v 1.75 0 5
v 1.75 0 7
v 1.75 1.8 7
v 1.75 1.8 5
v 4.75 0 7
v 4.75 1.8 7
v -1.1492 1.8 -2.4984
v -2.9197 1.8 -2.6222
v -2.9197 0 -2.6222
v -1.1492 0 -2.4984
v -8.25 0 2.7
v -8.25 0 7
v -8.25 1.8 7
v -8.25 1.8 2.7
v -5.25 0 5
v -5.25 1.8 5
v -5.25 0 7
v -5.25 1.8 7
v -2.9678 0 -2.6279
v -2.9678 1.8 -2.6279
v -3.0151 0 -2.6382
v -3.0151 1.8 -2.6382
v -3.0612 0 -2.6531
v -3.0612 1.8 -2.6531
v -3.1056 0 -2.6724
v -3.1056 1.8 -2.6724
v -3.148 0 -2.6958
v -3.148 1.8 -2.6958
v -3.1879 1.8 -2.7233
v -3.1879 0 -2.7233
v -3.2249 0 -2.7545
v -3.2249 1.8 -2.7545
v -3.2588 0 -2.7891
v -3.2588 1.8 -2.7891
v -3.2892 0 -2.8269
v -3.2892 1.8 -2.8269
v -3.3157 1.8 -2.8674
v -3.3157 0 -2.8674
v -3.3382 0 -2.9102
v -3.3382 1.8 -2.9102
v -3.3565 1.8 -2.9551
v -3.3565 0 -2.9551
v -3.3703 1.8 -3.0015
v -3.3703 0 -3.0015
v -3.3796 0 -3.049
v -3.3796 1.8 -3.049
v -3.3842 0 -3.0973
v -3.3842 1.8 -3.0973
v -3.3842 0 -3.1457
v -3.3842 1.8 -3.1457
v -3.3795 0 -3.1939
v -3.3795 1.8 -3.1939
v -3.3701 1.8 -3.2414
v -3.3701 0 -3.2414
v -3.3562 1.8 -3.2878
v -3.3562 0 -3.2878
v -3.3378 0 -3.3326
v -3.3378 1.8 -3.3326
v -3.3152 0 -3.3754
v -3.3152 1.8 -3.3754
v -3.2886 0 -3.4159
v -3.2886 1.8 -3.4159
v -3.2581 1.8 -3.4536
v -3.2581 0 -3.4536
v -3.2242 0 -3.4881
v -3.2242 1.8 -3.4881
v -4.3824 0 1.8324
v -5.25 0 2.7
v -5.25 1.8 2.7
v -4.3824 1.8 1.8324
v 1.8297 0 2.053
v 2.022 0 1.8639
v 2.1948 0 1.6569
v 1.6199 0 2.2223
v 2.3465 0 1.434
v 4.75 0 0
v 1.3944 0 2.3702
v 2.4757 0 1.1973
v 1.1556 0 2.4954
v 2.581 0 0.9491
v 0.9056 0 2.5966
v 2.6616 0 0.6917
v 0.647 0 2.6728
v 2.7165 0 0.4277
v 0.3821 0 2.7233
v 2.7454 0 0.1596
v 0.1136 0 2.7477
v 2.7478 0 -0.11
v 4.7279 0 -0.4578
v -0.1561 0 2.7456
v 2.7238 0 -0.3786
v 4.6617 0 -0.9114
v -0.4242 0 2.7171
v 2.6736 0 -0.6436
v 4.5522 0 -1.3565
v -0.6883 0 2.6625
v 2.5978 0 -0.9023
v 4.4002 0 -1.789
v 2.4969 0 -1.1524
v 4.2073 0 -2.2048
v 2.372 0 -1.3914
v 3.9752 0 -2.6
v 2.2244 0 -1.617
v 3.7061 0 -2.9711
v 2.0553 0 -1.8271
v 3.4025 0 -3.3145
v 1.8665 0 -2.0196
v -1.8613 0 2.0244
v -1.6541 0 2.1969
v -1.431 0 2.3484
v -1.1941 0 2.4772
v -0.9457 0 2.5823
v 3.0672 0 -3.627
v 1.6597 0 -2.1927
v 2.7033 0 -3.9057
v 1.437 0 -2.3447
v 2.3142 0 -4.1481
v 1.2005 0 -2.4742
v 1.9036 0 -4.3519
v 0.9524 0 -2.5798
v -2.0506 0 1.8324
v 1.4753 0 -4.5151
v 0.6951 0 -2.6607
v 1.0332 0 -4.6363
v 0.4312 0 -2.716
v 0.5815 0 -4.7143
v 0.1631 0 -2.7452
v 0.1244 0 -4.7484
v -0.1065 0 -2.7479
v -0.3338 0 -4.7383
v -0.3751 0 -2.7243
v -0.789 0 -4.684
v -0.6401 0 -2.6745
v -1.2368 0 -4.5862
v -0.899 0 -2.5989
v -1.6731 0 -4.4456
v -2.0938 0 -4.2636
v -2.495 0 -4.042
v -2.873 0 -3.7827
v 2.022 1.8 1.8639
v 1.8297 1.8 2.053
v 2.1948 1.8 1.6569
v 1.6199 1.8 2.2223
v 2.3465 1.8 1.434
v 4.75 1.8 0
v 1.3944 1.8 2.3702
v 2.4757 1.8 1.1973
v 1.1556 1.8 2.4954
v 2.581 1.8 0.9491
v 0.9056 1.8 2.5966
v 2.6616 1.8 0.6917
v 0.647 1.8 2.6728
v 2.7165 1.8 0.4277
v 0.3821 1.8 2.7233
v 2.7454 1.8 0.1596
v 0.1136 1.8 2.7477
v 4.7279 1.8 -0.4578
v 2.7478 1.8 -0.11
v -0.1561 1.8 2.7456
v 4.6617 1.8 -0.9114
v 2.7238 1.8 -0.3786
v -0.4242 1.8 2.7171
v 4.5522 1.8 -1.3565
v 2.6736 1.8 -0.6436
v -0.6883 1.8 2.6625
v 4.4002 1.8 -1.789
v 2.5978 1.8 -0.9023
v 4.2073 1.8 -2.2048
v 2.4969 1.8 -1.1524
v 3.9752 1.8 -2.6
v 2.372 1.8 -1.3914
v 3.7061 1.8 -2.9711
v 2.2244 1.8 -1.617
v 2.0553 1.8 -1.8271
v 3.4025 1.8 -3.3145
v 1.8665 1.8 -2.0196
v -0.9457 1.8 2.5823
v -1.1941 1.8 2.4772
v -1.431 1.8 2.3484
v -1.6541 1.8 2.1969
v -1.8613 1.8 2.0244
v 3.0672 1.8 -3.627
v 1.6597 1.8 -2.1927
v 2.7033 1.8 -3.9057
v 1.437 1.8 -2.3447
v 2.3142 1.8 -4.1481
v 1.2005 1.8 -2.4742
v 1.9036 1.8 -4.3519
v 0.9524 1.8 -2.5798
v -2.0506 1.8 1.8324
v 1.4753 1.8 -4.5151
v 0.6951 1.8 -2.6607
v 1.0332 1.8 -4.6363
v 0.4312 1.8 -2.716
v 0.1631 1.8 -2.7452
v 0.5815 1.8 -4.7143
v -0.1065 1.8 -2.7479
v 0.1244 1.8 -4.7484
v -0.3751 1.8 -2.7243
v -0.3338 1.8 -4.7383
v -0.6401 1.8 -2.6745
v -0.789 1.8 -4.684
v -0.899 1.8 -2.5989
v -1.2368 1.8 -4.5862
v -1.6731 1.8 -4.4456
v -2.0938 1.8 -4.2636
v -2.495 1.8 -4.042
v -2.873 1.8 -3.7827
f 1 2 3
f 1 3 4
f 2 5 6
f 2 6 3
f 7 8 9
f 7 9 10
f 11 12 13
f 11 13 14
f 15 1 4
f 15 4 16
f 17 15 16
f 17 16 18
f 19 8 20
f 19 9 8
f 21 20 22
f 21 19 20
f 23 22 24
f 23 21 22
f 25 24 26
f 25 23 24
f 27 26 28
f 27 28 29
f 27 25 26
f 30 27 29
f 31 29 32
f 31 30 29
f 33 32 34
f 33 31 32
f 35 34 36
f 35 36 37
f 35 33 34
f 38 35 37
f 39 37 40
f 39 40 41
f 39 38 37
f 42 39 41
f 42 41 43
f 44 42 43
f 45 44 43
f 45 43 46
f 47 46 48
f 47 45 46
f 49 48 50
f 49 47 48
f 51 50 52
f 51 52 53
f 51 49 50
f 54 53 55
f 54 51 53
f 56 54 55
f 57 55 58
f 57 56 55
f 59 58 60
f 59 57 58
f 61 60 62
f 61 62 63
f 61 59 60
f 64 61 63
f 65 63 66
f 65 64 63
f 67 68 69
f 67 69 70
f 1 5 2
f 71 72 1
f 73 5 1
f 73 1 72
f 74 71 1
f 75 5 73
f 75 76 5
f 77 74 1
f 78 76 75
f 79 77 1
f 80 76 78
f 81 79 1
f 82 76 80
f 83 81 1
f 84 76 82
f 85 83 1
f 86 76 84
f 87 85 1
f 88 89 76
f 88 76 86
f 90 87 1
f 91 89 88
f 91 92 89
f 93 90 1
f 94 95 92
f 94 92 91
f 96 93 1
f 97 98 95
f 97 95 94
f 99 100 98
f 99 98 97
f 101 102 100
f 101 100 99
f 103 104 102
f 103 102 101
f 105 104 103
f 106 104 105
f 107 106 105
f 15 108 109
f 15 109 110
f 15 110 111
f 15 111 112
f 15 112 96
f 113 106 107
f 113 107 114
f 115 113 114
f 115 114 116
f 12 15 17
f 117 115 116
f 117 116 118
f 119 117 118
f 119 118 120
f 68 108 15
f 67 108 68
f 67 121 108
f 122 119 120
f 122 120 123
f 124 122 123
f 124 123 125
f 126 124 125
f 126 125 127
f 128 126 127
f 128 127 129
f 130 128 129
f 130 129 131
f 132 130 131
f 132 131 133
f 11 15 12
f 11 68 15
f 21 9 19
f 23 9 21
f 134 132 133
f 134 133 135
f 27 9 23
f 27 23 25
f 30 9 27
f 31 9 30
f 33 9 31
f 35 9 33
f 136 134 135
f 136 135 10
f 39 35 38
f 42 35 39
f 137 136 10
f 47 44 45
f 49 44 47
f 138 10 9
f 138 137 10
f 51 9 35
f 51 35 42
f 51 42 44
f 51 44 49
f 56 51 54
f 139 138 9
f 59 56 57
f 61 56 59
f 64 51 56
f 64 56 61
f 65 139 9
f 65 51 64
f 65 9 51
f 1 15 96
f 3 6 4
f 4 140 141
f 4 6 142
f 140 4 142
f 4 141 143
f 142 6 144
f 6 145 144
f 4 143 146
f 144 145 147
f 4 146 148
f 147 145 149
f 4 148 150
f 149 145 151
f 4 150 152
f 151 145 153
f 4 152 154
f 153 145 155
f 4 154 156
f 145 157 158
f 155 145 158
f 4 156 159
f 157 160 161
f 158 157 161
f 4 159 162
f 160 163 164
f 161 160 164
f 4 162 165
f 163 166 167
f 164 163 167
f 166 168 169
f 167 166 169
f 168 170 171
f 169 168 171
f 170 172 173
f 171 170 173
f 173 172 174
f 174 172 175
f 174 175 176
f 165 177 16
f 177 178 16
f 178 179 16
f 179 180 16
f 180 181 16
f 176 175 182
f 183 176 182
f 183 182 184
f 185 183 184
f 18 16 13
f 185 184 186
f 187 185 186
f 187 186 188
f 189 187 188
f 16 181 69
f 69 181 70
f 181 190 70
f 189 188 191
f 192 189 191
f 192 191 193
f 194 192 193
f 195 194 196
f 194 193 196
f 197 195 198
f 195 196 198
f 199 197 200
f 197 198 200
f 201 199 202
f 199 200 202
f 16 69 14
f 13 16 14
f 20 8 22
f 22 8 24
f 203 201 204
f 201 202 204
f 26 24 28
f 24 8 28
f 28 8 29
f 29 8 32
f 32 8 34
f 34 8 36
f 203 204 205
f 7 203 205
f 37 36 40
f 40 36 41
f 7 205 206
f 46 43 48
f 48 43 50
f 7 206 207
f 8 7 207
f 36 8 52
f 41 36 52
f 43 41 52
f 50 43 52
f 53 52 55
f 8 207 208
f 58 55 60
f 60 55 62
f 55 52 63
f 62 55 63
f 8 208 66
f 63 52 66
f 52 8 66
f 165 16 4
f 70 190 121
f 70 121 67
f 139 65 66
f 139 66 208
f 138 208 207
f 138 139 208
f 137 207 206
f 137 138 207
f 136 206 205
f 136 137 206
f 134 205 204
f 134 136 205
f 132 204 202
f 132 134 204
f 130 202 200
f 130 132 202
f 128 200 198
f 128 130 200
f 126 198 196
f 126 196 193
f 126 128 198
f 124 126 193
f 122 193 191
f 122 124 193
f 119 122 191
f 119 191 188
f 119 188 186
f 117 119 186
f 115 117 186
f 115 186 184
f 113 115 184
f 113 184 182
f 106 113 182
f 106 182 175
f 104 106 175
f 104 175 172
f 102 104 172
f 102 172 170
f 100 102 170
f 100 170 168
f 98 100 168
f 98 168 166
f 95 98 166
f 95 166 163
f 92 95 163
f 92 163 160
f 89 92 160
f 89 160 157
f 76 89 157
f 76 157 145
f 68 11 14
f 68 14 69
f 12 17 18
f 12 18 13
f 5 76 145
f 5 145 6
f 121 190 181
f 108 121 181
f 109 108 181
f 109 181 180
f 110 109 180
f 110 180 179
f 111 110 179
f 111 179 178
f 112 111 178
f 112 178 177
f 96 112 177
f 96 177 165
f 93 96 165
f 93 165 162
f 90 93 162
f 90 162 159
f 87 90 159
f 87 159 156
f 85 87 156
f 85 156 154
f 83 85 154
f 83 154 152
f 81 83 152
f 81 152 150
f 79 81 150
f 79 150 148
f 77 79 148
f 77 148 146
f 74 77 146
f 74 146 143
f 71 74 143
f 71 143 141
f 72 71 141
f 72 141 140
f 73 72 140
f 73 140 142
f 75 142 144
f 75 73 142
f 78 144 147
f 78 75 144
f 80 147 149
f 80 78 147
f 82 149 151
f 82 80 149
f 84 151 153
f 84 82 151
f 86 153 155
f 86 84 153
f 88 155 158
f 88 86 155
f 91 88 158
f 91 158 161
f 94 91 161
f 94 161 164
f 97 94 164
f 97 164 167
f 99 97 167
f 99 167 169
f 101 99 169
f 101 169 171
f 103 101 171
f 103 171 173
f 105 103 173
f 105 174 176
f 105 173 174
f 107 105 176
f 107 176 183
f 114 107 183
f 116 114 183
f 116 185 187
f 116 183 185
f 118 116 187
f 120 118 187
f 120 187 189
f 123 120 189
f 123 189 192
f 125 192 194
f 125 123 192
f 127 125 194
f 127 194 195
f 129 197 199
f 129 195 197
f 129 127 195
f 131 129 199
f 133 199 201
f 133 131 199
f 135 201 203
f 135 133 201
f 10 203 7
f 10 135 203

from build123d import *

# Parameters (mm, degrees)
SKETCH1_R           = 2.75
BOSS_EXTRUDE1_DEPTH = 1.8
CUT_EXTRUDE1_DEPTH  = 1.8
FILLET1_R           = 0.5


with BuildPart() as part:
    # Sketch1 → Boss-Extrude1 (new body)
    with BuildSketch(Plane(origin=(0, 0, 0), x_dir=(1, 0, 0), z_dir=(0, 1, 0))):
        with BuildLine():
            Line((4.75, 0), (4.75, -5))
            Line((4.75, -5), (4.75, -7))
            Line((4.75, -7), (1.75, -7))
            Line((1.75, -7), (1.75, -5))
            Line((1.75, -5), (-5.25, -5))
            Line((-5.25, -5), (-5.25, -7))
            Line((-5.25, -7), (-8.25, -7))
            Line((-8.25, -7), (-8.25, -5))
            Line((-8.25, -5), (-8.25, -2.7))
            Line((-8.25, -2.7), (-5.25, -2.7))
            Line((-5.25, -2.7), (-4.382350157, -1.832350157))
            ThreePointArc((-4.382350157, -1.832350157), (-0.93443479, 4.657180652), (4.75, 0))
        make_face()
        Circle(SKETCH1_R, mode=Mode.SUBTRACT)
    extrude(amount=BOSS_EXTRUDE1_DEPTH)

    # Sketch2 → Cut-Extrude1 (cut)
    with BuildSketch(Plane(origin=(0, 1.8, 0), x_dir=(1, 0, 0), z_dir=(0, 1, 0))):
        Polygon((-5, 2.767649843), (0, 2.418015783), (0, -1.832350157), (-5, -1.832350157), align=None)
    extrude(amount=-CUT_EXTRUDE1_DEPTH, mode=Mode.SUBTRACT)

    # Fillet1
    fillet1_edges = [part.edges().sort_by_distance(p)[0] for p in [
        (-3.913732442, 0.9, -2.691690615),
    ]]
    fillet(fillet1_edges, radius=FILLET1_R)


solid = part.part
